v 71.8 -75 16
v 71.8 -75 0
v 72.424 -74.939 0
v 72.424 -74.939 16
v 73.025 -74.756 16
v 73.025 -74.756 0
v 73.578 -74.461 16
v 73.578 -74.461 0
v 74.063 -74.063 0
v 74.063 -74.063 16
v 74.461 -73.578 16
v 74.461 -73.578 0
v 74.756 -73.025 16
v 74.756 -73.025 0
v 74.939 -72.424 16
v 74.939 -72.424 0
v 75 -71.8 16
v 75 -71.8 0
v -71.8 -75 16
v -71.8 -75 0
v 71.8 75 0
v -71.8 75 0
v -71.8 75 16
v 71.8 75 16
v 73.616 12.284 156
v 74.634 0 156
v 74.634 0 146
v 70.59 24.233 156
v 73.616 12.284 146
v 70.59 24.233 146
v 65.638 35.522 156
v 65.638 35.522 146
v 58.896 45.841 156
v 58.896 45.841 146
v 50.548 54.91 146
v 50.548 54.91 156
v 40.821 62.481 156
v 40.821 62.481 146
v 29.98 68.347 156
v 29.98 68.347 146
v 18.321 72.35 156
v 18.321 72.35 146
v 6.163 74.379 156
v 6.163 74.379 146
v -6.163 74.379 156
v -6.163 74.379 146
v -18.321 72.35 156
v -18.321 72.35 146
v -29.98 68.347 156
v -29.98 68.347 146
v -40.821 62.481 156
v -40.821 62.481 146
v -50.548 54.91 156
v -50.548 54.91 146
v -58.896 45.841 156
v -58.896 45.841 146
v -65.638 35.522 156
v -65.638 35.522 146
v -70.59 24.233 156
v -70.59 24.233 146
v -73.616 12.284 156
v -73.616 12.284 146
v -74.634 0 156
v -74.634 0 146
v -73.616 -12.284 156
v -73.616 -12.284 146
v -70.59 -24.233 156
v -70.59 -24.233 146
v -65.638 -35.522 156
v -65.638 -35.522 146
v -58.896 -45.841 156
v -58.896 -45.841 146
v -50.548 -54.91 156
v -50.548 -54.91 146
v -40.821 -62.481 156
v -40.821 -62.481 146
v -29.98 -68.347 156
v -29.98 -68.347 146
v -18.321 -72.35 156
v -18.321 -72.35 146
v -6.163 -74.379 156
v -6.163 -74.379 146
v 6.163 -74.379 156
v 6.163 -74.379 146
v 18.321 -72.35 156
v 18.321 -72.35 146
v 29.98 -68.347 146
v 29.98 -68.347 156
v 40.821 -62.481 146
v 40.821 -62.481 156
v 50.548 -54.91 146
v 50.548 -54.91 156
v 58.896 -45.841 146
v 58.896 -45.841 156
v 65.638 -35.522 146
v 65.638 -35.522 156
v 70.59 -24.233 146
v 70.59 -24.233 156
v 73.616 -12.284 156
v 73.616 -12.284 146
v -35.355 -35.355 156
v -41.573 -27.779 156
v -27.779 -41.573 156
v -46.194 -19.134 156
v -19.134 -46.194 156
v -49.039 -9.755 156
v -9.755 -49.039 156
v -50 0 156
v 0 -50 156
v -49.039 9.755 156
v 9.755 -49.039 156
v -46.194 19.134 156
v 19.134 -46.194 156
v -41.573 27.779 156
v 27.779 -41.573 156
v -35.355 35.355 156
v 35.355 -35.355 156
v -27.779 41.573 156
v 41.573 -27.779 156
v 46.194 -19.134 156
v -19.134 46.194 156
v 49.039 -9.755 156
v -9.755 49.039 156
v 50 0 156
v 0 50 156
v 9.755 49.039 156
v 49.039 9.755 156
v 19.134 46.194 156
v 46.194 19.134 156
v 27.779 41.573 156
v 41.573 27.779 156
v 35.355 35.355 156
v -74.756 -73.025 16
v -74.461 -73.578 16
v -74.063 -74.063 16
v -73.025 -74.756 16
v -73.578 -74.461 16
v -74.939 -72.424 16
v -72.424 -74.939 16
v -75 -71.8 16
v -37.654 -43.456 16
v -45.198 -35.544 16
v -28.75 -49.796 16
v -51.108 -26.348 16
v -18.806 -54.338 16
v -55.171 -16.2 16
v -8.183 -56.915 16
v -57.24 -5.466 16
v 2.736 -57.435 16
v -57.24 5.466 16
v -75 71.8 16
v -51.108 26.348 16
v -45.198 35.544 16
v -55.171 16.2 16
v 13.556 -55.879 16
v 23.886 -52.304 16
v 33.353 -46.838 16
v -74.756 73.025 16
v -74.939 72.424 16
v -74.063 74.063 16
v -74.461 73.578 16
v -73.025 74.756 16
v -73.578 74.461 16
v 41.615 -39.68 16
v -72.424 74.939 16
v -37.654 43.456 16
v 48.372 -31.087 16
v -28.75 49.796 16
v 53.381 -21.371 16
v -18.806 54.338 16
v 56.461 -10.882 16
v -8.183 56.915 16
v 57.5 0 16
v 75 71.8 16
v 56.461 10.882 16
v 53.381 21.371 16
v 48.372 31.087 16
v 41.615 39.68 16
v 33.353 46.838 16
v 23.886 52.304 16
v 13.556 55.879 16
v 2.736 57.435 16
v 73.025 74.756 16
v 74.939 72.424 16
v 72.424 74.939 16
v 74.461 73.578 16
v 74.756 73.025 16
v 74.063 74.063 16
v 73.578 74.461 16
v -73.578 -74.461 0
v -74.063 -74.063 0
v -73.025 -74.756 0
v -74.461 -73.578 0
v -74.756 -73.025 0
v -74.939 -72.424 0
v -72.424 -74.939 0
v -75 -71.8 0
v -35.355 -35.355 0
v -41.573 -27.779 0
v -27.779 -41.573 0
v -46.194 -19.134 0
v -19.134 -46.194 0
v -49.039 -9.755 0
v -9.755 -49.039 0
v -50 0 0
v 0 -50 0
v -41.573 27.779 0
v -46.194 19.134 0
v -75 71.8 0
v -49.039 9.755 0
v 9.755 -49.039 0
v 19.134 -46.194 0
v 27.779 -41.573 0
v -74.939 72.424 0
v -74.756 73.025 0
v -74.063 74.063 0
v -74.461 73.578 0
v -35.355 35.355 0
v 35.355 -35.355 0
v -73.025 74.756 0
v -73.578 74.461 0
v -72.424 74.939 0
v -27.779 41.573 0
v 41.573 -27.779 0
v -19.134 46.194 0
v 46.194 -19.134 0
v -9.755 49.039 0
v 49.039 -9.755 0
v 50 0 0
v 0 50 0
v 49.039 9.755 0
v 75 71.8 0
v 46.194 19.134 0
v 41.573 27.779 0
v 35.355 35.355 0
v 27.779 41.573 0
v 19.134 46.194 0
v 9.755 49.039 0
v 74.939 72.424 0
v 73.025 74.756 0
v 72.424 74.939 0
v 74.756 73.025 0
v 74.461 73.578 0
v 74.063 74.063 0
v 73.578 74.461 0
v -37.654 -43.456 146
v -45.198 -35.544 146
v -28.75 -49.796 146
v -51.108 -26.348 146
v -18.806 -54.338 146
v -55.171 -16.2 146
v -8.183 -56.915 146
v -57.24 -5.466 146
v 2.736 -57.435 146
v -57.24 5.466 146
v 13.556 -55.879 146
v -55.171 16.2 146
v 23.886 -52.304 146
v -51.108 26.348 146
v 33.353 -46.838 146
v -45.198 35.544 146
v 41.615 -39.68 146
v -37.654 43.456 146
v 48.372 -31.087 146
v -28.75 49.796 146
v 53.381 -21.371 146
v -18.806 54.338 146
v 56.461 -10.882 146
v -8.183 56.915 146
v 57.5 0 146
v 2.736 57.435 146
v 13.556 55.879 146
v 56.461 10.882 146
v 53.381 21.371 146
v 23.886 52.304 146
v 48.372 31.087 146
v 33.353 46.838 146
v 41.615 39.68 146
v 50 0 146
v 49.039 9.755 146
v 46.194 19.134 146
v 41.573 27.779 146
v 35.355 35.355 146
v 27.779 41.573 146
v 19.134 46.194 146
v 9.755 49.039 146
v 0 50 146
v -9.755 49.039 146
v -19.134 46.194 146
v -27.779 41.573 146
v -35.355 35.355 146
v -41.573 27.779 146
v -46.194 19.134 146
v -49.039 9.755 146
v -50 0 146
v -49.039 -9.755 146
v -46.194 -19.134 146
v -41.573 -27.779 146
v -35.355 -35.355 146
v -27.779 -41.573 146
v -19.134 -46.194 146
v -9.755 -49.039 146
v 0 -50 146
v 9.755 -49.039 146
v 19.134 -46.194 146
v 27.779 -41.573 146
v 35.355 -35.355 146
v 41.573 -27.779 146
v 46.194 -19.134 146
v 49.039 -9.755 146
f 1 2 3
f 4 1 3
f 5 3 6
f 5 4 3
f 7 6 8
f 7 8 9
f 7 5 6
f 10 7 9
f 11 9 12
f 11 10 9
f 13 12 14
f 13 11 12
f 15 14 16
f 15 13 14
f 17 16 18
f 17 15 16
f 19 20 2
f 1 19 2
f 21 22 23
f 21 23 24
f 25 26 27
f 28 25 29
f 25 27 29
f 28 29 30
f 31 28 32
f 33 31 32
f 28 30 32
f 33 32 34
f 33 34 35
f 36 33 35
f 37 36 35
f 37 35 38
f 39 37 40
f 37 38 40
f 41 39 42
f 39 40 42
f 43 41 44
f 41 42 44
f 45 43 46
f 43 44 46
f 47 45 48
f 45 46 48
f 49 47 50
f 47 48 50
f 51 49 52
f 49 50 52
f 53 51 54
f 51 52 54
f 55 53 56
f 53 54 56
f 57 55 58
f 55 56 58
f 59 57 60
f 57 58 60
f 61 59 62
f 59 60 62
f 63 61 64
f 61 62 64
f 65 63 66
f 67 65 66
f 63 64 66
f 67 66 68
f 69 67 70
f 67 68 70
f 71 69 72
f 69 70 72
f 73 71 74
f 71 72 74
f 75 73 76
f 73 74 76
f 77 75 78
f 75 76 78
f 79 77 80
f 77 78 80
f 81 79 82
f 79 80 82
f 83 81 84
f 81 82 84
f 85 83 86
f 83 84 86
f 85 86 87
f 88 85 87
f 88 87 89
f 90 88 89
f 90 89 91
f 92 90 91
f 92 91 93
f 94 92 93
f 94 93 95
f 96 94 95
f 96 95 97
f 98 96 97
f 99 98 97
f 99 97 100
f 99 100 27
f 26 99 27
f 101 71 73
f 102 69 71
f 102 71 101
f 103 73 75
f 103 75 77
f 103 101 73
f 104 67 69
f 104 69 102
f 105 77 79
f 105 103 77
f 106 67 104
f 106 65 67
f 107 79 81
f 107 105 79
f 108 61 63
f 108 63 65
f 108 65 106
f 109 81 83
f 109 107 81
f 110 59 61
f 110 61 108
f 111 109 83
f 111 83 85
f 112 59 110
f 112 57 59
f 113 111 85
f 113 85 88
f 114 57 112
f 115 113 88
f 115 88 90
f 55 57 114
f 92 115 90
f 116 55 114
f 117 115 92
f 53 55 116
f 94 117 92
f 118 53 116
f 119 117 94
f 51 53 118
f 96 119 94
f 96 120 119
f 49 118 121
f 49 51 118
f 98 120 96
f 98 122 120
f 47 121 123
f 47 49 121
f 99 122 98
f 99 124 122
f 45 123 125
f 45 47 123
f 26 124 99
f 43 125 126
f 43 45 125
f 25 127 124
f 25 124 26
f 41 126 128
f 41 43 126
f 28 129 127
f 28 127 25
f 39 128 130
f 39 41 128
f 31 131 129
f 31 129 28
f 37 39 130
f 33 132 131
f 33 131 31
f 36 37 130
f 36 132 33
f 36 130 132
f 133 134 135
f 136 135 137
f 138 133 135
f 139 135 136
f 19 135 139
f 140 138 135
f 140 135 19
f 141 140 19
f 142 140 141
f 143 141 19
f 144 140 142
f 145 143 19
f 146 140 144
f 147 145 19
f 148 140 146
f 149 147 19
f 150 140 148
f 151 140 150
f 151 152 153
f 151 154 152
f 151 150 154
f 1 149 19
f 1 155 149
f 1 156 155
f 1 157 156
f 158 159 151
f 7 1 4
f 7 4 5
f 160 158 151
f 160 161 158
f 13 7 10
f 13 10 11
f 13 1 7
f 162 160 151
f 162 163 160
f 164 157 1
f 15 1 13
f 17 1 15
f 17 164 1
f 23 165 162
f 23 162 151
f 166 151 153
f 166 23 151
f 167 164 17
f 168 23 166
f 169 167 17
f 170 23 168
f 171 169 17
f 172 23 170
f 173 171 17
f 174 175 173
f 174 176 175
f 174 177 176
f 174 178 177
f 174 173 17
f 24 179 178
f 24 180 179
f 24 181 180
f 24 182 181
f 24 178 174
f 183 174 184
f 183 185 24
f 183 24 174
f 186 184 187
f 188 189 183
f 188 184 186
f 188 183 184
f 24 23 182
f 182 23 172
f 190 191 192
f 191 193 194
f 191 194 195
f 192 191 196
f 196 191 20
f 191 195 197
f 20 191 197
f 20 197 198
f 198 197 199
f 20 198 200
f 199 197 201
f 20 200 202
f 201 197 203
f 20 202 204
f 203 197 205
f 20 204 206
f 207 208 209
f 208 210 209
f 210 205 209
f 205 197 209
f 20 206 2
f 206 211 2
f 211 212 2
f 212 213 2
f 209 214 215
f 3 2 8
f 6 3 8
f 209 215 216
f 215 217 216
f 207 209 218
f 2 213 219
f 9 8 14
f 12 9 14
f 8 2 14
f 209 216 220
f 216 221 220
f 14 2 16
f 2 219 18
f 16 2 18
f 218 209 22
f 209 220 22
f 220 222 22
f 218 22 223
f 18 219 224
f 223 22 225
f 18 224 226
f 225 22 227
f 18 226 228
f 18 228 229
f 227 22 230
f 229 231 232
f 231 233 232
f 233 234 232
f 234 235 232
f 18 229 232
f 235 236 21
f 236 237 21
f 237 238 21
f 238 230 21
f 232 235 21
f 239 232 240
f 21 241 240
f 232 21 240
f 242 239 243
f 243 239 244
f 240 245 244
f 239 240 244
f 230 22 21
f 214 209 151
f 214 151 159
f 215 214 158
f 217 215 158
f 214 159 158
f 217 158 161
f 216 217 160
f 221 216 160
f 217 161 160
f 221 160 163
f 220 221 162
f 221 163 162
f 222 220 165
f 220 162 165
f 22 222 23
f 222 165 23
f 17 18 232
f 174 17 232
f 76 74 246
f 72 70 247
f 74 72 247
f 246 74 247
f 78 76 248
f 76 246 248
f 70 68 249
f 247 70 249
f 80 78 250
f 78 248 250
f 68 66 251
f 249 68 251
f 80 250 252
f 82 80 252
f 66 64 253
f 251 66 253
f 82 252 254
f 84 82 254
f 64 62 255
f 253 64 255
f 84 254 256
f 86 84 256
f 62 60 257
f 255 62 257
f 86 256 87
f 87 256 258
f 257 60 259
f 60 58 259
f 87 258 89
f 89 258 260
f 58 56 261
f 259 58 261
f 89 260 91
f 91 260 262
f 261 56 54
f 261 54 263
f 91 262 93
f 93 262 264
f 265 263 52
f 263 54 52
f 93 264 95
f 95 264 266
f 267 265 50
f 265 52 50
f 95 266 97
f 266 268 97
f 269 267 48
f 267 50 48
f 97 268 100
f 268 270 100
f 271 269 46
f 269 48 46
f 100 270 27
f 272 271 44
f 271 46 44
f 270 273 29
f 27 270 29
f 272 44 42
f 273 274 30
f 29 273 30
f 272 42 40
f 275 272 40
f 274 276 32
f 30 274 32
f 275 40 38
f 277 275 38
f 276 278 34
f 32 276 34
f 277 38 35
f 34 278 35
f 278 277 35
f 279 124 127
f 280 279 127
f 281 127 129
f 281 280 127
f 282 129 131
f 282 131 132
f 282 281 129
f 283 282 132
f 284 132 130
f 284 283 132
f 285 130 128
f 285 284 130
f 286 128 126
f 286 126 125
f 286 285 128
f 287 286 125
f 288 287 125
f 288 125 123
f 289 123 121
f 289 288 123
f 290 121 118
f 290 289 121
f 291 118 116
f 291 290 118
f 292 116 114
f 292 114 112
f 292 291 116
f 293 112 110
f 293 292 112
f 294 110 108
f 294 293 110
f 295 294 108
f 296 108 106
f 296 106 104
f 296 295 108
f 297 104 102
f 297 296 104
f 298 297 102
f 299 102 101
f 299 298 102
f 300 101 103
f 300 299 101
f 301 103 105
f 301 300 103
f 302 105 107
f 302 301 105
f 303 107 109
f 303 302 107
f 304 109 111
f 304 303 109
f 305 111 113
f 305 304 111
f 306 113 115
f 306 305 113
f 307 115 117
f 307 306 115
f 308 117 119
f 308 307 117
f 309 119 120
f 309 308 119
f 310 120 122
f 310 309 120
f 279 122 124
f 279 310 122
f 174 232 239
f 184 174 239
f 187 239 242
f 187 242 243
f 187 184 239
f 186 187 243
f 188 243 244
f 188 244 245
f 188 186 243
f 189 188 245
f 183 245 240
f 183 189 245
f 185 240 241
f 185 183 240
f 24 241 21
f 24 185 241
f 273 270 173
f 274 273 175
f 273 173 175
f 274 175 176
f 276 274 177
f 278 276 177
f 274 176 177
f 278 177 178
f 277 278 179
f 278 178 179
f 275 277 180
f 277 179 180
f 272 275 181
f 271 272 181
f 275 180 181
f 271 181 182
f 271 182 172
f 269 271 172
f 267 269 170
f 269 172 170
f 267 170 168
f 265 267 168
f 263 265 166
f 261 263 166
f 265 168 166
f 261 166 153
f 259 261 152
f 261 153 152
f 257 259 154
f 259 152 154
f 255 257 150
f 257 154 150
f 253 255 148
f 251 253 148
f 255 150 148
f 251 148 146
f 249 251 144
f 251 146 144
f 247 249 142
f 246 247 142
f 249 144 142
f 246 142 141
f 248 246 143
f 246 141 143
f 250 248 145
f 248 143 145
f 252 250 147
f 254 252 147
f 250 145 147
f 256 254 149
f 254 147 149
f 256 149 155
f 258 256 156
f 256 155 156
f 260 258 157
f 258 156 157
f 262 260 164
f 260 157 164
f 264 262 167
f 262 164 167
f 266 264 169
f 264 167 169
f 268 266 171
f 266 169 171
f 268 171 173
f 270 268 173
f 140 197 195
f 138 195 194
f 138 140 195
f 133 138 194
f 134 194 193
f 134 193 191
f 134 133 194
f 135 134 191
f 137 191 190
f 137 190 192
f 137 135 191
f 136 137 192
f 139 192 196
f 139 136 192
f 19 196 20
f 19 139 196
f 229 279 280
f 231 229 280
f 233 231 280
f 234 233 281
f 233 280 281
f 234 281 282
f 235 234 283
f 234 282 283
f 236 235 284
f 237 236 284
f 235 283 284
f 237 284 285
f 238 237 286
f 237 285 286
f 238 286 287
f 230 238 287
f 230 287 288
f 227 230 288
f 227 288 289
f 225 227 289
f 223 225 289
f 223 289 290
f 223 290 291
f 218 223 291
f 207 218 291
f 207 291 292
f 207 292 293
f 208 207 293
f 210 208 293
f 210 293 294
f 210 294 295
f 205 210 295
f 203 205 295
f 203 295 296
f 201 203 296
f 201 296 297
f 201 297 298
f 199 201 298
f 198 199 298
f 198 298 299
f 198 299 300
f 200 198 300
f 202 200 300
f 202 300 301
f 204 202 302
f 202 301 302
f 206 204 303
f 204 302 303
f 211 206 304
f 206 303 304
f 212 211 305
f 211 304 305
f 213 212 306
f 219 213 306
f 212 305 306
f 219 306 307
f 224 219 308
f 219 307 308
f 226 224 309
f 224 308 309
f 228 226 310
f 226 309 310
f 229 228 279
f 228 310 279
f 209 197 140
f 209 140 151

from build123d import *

# Parameters (mm, degrees)
F0_W      = 150
F0_H      = 150
F1_DEPTH  = 16
F2_R      = 3.2
F4_R      = 57.5
F5_DEPTH  = 130
F6_R      = 50
F7_DEPTH  = 146.001
F9_R      = 74.633597
F9_R_2    = 50
F10_DEPTH = 10


with BuildPart() as f1:
    # F0 (on Top) → F1 (new body)
    with BuildSketch(Plane.XY):
        Rectangle(F0_W, F0_H)
    extrude(amount=F1_DEPTH)

    # F2
    f2_edges = [f1.edges().sort_by_distance(p)[0] for p in [
        (-75, 75, 8),
        (75, 75, 8),
        (75, -75, 8),
        (-75, -75, 8),
    ]]
    fillet(f2_edges, radius=F2_R)

    # F4 (on face) → F5 (join)
    with BuildSketch(Plane.XY.offset(16)):
        Circle(F4_R)
    extrude(amount=F5_DEPTH)

    # F6 (on face) → F7 (cut, through all)
    with BuildSketch(Plane.XY.offset(146)):
        Circle(F6_R)
    extrude(amount=-F7_DEPTH, mode=Mode.SUBTRACT)

    # F9 (on face) → F10 (join)
    with BuildSketch(Plane.XY.offset(146)):
        Circle(F9_R)
        Circle(F9_R_2, mode=Mode.SUBTRACT)
    extrude(amount=F10_DEPTH)


solid = f1.part
